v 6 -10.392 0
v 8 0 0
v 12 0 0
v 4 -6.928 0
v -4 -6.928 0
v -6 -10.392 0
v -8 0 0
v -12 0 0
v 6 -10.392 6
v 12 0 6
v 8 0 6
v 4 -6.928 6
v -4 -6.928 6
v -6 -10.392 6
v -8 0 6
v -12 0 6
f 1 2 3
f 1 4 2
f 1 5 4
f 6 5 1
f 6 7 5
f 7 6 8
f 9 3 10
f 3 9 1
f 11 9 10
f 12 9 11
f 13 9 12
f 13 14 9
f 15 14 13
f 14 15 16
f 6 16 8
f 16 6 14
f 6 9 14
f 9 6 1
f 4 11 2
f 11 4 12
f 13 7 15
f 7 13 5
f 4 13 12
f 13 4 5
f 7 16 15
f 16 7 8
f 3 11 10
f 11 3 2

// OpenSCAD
$fn = 50;

difference() {
	union() {
		difference() {
			difference() {
				linear_extrude(height = 6) {
					polygon(points = [[12.0, 0.0], [6.000000000000002, 10.392304845413264], [-5.999999999999997, 10.392304845413264], [-12.0, 1.4695761589768238e-15], [-6.000000000000005, -10.392304845413262], [5.999999999999992, -10.392304845413268]]);
				}
				linear_extrude(height = 6) {
					polygon(points = [[8.0, 0.0], [4.000000000000001, 6.928203230275509], [-3.9999999999999982, 6.92820323027551], [-8.0, 9.797174393178826e-16], [-4.0000000000000036, -6.928203230275508], [3.9999999999999947, -6.928203230275512]]);
				}
			}
			translate(v = [0, 6.0, 3.0]) {
				cube(center = true, size = [24, 12, 6]);
			}
		}
	}
	union();
}
